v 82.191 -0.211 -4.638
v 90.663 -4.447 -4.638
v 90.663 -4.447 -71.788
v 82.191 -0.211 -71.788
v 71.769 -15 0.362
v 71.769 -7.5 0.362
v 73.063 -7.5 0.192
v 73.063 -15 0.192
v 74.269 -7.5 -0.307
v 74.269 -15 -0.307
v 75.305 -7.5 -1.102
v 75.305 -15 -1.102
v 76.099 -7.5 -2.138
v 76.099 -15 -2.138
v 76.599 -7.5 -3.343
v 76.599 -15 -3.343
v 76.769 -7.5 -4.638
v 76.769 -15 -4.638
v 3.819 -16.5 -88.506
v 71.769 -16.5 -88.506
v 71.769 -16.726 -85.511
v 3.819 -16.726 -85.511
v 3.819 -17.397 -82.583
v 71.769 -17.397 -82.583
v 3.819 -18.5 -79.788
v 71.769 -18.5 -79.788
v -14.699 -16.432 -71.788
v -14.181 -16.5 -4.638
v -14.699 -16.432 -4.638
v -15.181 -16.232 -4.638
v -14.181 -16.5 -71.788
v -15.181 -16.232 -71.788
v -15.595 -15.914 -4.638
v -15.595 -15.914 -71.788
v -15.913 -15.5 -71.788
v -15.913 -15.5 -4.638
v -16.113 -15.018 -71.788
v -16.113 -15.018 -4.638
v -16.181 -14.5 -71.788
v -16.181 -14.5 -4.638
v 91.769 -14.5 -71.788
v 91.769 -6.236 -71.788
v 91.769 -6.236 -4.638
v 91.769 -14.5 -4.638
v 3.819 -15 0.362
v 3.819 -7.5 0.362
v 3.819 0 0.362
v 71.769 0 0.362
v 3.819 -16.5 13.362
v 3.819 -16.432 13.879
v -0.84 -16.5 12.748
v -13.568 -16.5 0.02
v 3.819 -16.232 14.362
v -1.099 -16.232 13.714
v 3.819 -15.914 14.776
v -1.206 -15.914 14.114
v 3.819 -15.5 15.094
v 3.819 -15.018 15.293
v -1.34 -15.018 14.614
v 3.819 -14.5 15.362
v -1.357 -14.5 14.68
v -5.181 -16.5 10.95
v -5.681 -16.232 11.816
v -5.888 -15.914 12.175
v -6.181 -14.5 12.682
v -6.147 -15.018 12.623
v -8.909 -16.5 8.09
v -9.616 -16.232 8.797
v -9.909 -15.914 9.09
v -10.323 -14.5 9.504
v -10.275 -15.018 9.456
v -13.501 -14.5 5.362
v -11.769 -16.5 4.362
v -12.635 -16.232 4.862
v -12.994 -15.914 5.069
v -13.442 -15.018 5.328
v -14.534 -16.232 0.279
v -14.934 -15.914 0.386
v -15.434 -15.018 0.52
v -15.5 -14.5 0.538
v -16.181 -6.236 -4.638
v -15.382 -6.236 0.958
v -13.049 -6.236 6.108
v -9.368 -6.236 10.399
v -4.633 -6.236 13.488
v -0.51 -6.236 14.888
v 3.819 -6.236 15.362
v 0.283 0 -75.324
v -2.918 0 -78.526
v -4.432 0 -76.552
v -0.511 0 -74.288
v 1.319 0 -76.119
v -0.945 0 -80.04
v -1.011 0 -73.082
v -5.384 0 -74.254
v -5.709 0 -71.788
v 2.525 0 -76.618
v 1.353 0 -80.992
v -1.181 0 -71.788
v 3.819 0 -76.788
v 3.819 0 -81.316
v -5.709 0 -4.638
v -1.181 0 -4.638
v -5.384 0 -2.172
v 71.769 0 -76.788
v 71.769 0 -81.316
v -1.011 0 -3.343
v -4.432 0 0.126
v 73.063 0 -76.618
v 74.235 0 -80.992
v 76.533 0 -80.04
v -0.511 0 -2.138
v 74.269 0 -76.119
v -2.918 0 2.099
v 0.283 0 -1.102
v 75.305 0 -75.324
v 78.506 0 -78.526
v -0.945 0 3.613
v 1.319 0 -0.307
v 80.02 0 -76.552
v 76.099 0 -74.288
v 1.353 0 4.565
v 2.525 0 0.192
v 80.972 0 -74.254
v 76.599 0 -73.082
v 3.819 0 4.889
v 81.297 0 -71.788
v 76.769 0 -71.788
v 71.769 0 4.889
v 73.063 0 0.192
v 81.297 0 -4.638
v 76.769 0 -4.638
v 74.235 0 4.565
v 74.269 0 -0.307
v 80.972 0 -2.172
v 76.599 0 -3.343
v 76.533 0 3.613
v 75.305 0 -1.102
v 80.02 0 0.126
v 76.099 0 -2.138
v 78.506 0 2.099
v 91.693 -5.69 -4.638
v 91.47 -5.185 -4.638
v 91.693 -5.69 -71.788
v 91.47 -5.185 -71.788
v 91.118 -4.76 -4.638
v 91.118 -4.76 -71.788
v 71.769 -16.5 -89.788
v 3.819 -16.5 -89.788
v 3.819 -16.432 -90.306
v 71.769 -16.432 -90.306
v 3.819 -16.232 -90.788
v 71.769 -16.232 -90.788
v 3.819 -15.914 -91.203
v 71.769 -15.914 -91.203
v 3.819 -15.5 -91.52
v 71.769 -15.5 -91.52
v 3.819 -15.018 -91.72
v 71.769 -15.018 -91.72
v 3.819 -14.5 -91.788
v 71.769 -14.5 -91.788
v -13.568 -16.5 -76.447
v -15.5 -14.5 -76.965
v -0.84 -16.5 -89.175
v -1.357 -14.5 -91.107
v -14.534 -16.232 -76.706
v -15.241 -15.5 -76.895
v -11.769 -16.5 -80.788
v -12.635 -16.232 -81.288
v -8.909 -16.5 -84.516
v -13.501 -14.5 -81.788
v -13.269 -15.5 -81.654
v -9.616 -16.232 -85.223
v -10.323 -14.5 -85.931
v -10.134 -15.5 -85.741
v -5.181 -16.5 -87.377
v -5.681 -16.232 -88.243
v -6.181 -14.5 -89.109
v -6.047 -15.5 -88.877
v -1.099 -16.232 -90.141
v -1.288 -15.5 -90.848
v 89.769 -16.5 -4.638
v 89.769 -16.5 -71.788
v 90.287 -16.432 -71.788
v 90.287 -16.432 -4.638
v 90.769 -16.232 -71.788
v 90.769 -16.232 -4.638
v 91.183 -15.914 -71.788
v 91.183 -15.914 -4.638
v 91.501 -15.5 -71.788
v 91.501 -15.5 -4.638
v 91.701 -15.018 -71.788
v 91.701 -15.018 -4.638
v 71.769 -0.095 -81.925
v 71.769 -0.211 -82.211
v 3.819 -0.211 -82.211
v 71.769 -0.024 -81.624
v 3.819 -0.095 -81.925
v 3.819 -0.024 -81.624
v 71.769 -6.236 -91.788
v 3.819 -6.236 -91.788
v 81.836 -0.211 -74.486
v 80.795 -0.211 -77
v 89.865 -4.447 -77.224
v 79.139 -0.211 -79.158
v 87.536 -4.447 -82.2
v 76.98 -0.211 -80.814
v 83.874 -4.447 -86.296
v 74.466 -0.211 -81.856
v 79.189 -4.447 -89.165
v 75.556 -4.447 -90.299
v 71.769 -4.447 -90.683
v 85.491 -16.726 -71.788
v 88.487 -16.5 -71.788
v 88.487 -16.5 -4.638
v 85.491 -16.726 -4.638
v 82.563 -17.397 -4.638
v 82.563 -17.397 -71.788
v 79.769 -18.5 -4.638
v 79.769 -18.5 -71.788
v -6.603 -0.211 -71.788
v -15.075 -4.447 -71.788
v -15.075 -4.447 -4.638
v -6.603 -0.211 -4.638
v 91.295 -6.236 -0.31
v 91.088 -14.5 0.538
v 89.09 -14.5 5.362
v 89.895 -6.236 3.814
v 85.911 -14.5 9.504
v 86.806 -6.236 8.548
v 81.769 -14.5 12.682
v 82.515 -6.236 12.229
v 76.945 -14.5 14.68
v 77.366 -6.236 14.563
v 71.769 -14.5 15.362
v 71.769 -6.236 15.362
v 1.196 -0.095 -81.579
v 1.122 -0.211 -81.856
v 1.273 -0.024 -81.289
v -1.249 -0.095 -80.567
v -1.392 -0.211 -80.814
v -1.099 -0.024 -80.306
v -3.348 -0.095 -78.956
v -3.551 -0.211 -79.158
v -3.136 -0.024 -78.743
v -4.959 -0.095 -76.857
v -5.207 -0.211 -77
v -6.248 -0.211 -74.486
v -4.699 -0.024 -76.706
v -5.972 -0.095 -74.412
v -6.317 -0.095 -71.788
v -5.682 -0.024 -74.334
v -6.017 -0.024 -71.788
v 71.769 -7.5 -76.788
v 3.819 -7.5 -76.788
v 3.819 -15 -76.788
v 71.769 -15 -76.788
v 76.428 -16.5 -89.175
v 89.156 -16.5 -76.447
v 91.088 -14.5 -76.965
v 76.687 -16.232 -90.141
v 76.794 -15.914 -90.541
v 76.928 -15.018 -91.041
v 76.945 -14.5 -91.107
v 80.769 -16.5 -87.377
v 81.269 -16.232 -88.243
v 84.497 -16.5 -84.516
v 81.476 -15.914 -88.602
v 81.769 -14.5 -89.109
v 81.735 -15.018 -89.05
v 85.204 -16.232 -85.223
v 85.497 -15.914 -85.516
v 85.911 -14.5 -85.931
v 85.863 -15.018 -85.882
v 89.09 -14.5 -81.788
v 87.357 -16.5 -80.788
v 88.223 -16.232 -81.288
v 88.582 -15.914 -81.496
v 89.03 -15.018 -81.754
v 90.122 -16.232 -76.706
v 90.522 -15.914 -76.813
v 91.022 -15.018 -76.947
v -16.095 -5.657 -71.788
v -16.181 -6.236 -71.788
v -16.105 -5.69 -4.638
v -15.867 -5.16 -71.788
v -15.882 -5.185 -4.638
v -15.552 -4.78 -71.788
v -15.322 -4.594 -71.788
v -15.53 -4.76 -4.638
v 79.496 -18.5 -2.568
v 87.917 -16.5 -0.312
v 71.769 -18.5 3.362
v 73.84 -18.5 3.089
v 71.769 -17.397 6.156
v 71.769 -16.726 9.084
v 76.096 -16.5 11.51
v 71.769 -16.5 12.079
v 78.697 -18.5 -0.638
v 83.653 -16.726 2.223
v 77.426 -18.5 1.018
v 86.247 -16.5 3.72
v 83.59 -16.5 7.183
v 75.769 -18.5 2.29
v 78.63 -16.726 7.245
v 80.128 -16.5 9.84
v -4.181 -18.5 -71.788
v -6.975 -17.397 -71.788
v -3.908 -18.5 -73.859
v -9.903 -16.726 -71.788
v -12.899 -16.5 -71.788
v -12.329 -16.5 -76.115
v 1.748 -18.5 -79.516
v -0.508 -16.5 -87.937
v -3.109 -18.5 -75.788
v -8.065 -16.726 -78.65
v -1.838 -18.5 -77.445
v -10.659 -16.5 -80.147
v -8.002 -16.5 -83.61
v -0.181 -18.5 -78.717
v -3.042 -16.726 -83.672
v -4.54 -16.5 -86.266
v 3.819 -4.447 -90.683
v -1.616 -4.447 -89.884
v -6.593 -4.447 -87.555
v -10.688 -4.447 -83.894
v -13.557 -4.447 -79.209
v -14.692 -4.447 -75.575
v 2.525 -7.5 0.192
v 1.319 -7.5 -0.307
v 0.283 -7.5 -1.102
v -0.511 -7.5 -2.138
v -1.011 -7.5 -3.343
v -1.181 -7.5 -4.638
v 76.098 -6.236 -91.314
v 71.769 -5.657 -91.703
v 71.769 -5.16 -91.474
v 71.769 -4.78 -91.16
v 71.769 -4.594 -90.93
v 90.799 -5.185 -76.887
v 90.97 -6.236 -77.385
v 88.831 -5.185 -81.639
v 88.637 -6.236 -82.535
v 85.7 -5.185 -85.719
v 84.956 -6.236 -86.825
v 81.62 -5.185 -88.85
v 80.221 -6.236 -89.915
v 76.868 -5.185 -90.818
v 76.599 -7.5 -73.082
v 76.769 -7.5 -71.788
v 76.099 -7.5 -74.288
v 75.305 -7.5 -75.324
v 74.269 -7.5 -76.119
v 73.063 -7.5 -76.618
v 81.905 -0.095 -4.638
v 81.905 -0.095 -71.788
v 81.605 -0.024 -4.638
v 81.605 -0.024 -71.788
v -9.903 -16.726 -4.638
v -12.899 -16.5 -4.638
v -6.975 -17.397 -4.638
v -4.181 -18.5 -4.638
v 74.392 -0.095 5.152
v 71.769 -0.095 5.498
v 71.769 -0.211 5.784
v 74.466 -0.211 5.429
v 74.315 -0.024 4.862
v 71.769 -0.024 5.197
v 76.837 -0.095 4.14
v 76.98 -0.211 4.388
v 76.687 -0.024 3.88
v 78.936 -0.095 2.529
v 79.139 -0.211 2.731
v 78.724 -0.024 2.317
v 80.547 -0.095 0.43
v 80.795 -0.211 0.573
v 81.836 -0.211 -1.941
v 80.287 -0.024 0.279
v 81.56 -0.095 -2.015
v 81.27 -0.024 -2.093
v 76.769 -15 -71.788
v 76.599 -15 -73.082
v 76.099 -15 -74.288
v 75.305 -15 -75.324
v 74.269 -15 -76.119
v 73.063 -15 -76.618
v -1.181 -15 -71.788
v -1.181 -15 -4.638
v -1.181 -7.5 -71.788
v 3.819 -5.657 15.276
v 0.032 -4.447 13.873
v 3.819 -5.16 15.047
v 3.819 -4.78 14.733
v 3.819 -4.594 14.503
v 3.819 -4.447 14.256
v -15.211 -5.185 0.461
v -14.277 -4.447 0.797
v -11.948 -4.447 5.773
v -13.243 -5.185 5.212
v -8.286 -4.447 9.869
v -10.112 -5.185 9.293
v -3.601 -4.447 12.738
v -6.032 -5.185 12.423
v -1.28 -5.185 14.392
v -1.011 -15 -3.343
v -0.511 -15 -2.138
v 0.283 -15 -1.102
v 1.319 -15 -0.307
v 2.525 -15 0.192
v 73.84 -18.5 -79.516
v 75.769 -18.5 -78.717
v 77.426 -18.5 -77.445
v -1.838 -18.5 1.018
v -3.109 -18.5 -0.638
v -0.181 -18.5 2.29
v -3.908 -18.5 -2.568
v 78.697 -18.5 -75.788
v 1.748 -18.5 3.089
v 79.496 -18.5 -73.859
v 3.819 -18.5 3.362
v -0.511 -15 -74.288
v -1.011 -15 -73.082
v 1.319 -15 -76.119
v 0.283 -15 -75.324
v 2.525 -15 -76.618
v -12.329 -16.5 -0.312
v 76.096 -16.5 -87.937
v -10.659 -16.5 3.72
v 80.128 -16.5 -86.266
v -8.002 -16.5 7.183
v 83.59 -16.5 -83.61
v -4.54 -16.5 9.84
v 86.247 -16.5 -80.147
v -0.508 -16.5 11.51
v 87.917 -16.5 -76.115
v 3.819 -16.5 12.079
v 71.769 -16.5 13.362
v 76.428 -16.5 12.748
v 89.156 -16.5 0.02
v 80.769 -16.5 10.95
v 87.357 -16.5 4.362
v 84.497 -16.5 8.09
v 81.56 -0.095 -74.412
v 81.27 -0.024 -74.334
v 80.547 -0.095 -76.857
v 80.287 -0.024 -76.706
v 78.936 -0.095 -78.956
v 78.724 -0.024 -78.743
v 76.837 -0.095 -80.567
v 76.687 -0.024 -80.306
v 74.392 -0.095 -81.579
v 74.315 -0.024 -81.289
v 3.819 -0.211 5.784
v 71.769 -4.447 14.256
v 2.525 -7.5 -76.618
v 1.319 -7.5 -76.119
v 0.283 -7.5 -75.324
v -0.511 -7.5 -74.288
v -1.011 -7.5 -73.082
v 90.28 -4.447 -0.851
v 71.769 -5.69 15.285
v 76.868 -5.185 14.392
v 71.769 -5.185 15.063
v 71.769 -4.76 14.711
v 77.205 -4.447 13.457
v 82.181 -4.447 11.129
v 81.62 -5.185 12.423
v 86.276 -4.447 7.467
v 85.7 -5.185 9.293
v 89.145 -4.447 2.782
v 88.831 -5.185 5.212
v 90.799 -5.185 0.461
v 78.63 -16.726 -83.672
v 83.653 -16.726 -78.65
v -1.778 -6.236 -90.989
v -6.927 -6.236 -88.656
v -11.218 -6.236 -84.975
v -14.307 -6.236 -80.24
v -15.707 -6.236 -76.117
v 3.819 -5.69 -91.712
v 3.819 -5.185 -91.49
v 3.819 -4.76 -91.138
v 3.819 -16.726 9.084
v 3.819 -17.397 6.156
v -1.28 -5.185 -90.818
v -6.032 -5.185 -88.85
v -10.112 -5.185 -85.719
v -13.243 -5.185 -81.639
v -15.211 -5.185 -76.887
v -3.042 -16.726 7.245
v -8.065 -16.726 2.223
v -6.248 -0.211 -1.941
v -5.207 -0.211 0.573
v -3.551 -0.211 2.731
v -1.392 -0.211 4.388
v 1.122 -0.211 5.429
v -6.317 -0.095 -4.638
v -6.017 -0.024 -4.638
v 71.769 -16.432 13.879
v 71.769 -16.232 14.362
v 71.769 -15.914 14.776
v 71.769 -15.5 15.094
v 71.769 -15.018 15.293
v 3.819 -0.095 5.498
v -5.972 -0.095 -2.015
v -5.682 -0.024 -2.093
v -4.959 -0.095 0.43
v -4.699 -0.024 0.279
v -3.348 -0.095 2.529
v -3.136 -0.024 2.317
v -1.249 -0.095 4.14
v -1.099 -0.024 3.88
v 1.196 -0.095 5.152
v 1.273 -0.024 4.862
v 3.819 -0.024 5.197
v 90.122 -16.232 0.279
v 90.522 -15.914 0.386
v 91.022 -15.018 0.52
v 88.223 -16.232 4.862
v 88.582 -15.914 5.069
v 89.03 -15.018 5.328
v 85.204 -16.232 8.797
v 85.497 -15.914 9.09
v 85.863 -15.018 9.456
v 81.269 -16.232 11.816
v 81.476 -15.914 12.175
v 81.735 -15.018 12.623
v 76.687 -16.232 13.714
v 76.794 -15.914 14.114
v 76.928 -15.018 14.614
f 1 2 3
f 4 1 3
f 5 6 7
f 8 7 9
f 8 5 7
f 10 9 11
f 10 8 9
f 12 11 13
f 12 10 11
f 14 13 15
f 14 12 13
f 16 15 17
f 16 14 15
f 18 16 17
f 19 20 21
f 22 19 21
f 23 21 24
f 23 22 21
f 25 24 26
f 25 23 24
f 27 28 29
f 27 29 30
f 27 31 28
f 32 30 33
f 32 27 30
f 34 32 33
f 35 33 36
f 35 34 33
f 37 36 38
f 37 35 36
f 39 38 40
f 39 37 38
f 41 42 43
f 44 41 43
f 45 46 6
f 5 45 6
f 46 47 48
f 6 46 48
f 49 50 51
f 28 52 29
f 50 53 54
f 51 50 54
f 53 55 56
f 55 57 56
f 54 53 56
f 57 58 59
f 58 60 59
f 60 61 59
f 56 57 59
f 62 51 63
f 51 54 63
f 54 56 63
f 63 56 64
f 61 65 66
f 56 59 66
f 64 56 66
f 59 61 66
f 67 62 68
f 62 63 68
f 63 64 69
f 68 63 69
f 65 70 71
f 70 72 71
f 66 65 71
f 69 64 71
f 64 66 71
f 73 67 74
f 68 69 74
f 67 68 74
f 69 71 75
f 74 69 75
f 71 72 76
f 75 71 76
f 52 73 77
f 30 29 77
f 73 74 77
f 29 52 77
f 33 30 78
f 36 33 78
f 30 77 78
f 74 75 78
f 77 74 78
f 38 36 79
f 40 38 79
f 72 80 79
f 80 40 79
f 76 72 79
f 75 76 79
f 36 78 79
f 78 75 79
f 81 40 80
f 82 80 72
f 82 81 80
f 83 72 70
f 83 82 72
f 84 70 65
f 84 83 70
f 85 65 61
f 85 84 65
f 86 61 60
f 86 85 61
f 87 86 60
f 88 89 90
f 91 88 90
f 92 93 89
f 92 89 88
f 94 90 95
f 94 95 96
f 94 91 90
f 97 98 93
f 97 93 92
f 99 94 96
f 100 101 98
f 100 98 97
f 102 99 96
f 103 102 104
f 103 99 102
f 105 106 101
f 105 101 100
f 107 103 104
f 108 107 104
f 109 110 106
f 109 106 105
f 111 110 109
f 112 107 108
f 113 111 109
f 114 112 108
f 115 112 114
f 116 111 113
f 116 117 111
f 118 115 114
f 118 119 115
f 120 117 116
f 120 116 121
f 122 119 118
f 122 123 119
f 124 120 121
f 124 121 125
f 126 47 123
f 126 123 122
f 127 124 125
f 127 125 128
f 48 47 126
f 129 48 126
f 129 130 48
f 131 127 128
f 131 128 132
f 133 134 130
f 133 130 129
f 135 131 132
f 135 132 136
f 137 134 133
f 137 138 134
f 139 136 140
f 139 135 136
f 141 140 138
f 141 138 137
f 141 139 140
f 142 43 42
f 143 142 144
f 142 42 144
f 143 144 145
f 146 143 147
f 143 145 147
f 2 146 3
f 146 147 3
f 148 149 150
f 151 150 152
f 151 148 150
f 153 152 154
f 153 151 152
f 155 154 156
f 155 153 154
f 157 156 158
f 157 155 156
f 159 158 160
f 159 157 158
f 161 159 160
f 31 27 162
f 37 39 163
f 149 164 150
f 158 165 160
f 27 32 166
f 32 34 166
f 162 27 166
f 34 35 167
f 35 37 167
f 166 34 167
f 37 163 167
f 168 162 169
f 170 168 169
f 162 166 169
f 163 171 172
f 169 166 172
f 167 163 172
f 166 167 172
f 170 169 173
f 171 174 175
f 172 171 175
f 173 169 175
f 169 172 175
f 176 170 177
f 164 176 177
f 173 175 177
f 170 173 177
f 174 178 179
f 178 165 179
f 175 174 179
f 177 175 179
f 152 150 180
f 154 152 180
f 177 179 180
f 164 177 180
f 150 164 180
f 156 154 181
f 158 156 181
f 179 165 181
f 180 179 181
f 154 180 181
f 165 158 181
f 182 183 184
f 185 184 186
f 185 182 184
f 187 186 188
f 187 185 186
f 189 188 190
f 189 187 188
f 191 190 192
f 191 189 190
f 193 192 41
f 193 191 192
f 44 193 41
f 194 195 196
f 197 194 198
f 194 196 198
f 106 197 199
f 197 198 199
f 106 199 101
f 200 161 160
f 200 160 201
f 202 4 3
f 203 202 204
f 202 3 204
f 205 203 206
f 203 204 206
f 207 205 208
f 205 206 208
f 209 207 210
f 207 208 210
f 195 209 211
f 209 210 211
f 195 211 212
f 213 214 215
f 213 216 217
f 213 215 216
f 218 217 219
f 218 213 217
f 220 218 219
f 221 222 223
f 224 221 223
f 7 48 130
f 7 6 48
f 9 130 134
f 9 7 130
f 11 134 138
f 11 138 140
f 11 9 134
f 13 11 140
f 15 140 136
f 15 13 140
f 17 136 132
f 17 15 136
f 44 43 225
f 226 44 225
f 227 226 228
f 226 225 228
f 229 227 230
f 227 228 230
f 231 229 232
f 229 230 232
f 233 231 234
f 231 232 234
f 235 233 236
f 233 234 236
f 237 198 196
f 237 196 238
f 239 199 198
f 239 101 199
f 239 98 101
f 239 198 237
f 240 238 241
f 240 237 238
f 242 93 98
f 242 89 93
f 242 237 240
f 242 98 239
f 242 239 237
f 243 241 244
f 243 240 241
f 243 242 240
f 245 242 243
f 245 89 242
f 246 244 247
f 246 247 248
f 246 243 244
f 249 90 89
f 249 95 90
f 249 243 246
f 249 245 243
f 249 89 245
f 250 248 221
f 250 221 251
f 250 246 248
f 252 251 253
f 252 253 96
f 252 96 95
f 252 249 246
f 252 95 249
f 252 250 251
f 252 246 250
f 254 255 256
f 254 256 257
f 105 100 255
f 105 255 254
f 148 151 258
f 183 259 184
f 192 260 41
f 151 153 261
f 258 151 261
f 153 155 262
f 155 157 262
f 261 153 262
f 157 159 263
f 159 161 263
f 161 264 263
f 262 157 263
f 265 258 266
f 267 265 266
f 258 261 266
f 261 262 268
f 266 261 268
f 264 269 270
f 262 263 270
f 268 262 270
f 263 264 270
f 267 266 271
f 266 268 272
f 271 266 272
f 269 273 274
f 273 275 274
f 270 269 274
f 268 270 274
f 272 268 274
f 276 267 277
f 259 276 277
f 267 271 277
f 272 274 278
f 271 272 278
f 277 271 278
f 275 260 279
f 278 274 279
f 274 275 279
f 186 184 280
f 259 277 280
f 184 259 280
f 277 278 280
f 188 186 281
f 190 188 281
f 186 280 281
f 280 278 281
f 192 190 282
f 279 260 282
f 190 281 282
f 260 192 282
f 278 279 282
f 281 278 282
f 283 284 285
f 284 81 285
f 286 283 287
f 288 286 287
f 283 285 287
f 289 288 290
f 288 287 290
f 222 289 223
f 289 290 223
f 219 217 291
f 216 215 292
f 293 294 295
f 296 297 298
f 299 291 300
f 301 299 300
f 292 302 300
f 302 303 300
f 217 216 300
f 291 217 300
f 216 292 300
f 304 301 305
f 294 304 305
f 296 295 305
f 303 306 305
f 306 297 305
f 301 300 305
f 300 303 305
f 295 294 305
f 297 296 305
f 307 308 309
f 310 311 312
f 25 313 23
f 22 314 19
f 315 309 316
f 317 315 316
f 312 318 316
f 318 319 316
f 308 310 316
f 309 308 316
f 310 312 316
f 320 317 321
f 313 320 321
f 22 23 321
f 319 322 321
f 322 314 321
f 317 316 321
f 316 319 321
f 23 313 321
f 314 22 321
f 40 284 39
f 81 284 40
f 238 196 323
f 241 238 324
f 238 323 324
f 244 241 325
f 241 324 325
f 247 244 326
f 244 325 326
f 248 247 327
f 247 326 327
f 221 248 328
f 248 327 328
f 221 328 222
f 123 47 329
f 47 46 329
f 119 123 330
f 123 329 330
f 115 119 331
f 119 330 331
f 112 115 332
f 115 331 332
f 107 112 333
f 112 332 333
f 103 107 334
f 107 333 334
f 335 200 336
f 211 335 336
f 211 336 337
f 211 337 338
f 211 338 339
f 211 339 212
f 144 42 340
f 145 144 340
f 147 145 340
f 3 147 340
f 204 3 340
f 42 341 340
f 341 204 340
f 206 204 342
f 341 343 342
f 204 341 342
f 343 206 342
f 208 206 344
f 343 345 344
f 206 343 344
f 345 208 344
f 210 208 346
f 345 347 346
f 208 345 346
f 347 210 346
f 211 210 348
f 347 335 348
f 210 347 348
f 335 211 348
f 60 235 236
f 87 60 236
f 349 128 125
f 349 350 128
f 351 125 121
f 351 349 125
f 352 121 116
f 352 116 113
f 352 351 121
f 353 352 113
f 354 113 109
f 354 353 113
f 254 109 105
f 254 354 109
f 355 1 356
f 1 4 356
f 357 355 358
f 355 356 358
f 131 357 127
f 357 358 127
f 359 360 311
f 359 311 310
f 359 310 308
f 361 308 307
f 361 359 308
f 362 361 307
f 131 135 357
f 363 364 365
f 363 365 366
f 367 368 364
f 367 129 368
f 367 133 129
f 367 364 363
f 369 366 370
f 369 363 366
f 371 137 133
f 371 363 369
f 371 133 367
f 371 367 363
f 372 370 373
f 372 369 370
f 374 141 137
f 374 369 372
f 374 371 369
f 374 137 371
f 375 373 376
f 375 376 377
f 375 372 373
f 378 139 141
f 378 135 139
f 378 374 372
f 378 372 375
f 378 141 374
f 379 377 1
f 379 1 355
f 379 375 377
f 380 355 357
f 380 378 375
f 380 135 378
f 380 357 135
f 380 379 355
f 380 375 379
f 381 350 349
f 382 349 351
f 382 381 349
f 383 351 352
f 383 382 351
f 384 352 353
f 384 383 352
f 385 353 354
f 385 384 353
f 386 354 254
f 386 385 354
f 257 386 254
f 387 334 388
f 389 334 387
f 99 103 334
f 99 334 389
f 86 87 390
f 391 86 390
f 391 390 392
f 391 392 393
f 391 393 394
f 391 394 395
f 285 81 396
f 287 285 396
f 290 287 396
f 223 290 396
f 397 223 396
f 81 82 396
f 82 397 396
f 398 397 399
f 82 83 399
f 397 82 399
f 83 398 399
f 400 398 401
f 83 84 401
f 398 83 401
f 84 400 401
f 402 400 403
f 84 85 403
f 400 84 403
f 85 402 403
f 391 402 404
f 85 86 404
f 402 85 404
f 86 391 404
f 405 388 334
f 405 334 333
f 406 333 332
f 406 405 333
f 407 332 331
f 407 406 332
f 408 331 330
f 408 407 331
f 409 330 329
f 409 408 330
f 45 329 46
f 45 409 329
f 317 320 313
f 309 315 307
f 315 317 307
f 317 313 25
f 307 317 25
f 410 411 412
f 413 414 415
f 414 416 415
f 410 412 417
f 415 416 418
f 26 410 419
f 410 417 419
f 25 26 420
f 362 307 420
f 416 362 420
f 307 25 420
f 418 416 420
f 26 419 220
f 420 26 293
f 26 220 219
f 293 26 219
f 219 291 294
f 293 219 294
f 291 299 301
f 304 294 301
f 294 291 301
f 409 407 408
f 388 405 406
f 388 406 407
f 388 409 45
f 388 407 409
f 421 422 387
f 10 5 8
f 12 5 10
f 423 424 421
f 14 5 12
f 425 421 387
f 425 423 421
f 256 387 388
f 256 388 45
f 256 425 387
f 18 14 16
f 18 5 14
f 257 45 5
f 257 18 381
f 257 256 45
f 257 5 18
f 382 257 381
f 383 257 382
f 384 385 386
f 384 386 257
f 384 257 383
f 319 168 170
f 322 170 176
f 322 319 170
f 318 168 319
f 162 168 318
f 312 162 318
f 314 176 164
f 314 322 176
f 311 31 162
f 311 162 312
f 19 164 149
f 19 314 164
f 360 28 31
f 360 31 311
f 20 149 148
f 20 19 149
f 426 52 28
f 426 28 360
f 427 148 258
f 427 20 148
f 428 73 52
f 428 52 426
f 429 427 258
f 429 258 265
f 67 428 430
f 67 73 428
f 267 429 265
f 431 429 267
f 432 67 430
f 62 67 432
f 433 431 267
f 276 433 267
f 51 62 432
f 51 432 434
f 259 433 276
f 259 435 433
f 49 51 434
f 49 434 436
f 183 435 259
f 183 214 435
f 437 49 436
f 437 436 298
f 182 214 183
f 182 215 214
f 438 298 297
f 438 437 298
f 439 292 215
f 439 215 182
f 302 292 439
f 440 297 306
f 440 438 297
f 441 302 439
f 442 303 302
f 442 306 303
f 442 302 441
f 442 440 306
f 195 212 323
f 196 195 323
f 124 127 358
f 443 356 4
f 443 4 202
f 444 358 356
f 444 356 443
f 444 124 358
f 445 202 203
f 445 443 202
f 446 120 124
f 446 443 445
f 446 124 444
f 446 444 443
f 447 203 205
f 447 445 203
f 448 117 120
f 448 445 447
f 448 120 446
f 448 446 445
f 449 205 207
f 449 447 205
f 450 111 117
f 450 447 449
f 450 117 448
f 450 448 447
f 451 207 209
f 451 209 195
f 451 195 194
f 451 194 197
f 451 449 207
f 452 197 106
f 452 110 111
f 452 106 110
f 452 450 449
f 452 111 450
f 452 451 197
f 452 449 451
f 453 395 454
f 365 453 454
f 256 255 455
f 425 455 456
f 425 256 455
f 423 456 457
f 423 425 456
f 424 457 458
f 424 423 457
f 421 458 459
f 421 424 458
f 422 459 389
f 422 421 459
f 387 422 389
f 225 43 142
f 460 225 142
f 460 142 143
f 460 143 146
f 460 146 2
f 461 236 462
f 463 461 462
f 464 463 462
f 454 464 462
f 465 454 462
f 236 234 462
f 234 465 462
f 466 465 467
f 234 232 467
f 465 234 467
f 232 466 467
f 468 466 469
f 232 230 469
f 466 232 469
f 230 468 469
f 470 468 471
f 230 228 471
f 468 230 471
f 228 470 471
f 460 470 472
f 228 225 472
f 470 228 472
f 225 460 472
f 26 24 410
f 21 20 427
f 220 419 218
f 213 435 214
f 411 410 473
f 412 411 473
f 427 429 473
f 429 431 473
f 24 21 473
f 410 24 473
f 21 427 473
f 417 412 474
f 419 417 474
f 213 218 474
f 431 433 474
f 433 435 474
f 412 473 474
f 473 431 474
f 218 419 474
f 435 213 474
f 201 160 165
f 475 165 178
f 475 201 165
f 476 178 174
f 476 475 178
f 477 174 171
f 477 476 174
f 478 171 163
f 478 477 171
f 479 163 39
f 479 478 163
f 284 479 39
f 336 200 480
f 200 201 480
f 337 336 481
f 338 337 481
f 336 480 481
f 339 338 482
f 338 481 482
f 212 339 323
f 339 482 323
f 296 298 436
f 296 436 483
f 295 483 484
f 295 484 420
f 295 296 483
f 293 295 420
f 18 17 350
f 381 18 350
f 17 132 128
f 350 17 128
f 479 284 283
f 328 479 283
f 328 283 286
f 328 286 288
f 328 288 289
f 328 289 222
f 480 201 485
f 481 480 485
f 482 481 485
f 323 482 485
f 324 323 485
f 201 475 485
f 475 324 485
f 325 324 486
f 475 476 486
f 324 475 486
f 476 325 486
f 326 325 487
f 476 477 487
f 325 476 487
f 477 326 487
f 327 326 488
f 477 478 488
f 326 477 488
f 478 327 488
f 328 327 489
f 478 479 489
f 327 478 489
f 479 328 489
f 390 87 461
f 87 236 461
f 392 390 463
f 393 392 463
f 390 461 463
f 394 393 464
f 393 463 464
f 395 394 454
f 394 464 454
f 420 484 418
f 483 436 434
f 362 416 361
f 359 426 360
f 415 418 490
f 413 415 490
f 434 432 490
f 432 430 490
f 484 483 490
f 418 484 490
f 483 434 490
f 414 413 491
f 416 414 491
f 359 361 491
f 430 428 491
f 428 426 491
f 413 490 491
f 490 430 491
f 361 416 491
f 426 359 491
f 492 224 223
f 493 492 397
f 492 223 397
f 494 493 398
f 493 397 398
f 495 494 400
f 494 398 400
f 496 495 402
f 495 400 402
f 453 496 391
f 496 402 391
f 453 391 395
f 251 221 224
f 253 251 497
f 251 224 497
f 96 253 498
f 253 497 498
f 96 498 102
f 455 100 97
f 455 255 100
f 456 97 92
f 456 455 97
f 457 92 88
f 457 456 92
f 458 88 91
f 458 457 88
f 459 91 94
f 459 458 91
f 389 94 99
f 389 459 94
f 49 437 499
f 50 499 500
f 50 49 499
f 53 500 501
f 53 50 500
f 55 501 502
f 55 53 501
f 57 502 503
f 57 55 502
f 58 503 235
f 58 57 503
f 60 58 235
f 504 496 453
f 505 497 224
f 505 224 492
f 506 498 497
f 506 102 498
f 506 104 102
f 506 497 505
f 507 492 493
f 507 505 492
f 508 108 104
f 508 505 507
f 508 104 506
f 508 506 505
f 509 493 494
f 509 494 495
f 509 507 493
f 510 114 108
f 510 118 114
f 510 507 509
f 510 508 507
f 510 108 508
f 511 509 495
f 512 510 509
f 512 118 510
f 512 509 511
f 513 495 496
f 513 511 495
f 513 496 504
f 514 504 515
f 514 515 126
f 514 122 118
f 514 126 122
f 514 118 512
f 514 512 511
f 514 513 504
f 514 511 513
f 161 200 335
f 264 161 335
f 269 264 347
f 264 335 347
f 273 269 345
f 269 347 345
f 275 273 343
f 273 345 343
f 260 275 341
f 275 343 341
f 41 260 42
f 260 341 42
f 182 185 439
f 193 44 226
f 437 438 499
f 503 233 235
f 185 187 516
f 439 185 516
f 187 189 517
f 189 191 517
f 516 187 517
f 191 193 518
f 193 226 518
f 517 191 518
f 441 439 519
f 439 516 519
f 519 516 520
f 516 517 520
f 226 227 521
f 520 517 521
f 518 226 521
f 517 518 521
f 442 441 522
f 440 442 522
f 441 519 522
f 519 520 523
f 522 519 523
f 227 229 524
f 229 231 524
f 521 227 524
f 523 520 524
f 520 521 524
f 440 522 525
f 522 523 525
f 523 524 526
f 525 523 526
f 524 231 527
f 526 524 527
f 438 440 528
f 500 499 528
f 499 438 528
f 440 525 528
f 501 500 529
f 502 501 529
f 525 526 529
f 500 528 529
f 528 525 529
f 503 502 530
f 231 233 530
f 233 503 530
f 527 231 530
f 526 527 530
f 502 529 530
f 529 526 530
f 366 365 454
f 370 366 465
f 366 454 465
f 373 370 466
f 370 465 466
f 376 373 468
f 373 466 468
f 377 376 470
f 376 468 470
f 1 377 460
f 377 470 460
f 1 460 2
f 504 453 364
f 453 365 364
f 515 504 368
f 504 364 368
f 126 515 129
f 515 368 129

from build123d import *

# Parameters (mm, degrees)
SKETCH5_W           = 107.15
SKETCH5_H           = 18.5
BOSS_EXTRUDE1_DEPTH = 107.94999
SKETCH4_W           = 77.94999
SKETCH4_H           = 77.15084
CUT_EXTRUDE1_DEPTH  = 7.5
FILLET1_R           = 5
FILLET3_R           = 20
CHAMFER1_SIZE       = 10
CHAMFER1_SIZE2      = 5
CUT_EXTRUDE2_DEPTH  = 2
FILLET4_R           = 20
FILLET5_R           = 2
CUT_EXTRUDE3_START  = -7.5
CUT_EXTRUDE3_DEPTH  = 7.5


with BuildPart() as part:
    # Sketch5 → Boss-Extrude1 (new body)
    with BuildSketch(Plane.ZY.offset(-91.769)):
        with Locations((-38.2134, -9.25)):
            Rectangle(SKETCH5_W, SKETCH5_H)
    extrude(amount=BOSS_EXTRUDE1_DEPTH)

    # Sketch4 → Cut-Extrude1 (cut)
    with BuildSketch(Plane(origin=(0, 0, 0), x_dir=(1, 0, 0), z_dir=(0, 1, 0))):
        with Locations((37.794005, 38.21298)):
            Rectangle(SKETCH4_W, SKETCH4_H)
    extrude(amount=-CUT_EXTRUDE1_DEPTH, mode=Mode.SUBTRACT)

    # Fillet1
    fillet1_edges = [part.edges().sort_by_distance(p)[0] for p in [
        (76.769, -3.75, -76.7884),
        (76.769, -3.75, 0.36244),
        (-1.18099, -3.75, 0.36244),
        (-1.18099, -3.75, -76.7884),
    ]]
    fillet(fillet1_edges, radius=FILLET1_R)

    # Fillet3
    fillet3_edges = [part.edges().sort_by_distance(p)[0] for p in [
        (-16.18099, -9.25, -91.7884),
        (-16.18099, -9.25, 15.3616),
        (91.769, -9.25, -91.7884),
        (91.769, -9.25, 15.3616),
    ]]
    fillet(fillet3_edges, radius=FILLET3_R)

    # Chamfer1
    chamfer1_edges = [part.edges().sort_by_distance(p)[0] for p in [
        (37.794005, 0, -91.7884),
        (91.769, 0, -38.2134),
        (-16.18099, 0, -38.2134),
        (37.794005, 0, 15.3616),
        (-10.323125624, 0, -85.930535624),
        (-10.323125624, 0, 9.503735624),
        (85.911135624, 0, 9.503735624),
        (85.911135624, 0, -85.930535624),
    ]]
    chamfer1_side = [part.faces().sort_by_distance(p)[0] for p in [
        (37.794005, 0, 13.840602865),
    ]]
    chamfer(chamfer1_edges, length=CHAMFER1_SIZE, length2=CHAMFER1_SIZE2, reference=chamfer1_side[0])

    # Sketch6 → Cut-Extrude2 (cut)
    with BuildSketch(Plane.XZ.offset(18.5)):
        with BuildLine():
            Line((3.81901, -91.7884), (71.769, -91.7884))
            ThreePointArc((71.769, -91.7884), (85.911135624, -85.930535624), (91.769, -71.7884))
            Line((91.769, -71.7884), (91.769, -4.6384))
            ThreePointArc((91.769, -4.6384), (85.911135624, 9.503735624), (71.769, 15.3616))
            Line((71.769, 15.3616), (3.81901, 15.3616))
            ThreePointArc((3.81901, 15.3616), (-10.323125624, 9.503735624), (-16.18099, -4.6384))
            Line((-16.18099, -4.6384), (-16.18099, -71.7884))
            ThreePointArc((-16.18099, -71.7884), (-10.323125624, -85.930535624), (3.81901, -91.7884))
        make_face()
        with BuildLine():
            Line((3.81901, -79.7884), (71.769, -79.7884))
            ThreePointArc((71.769, -79.7884), (77.425854249, -77.445254249), (79.769, -71.7884))
            Line((79.769, -71.7884), (79.769, -4.6384))
            ThreePointArc((79.769, -4.6384), (77.425854249, 1.018454249), (71.769, 3.3616))
            Line((71.769, 3.3616), (3.81901, 3.3616))
            ThreePointArc((3.81901, 3.3616), (-1.837844249, 1.018454249), (-4.18099, -4.6384))
            Line((-4.18099, -4.6384), (-4.18099, -71.7884))
            ThreePointArc((-4.18099, -71.7884), (-1.837844249, -77.445254249), (3.81901, -79.7884))
        make_face(mode=Mode.SUBTRACT)
    extrude(amount=-CUT_EXTRUDE2_DEPTH, mode=Mode.SUBTRACT)

    # Fillet4
    # the kernel refuses this fillet: 20 mm, written as the material it adds along each edge
    with BuildSketch(Plane(origin=(71.769, -16.5, -4.6384), x_dir=(1, 0, 0), z_dir=(0, 0, -1))) as fillet4_piece_1:
        with BuildLine():
            CenterArc((16.717797887, 20), FILLET4_R, 244.158067237, 25.841932763)
            Line((8, 2), (8, 0))
            Line((8, 0), (16.717797887, 0))
        make_face()
    revolve(axis=Axis((71.769, -16.5, -4.6384), (0, -1, 0)), revolution_arc=90)
    with BuildSketch(Plane(origin=(79.769, -16.5, -71.7884), x_dir=(1, 0, 0), z_dir=(0, 0, 1)), Plane(origin=(-4.18099, -16.5, -4.6384), x_dir=(-1, 0, 0), z_dir=(0, 0, -1))) as fillet4_piece_2:
        with BuildLine():
            CenterArc((8.717797887, -20), FILLET4_R, 90, 25.841932763)
            Line((0, -2), (0, 0))
            Line((0, 0), (8.717797887, 0))
        make_face()
    extrude(amount=67.15)
    with BuildSketch(Plane(origin=(71.769, -16.5, -71.7884), x_dir=(0, 0, -1), z_dir=(-1, 0, 0))) as fillet4_piece_3:
        with BuildLine():
            CenterArc((16.717797887, 20), FILLET4_R, 244.158067237, 25.841932763)
            Line((8, 2), (8, 0))
            Line((8, 0), (16.717797887, 0))
        make_face()
    revolve(axis=Axis((71.769, -16.5, -71.7884), (0, -1, 0)), revolution_arc=90)
    with BuildSketch(Plane(origin=(3.81901, -16.5, -79.7884), x_dir=(0, 0, -1), z_dir=(1, 0, 0)), Plane(origin=(71.769, -16.5, 3.3616), x_dir=(0, 0, 1), z_dir=(-1, 0, 0))) as fillet4_piece_4:
        with BuildLine():
            CenterArc((8.717797887, -20), FILLET4_R, 90, 25.841932763)
            Line((0, -2), (0, 0))
            Line((0, 0), (8.717797887, 0))
        make_face()
    extrude(amount=67.94999)
    with BuildSketch(Plane(origin=(3.81901, -16.5, -71.7884), x_dir=(-1, 0, 0), z_dir=(0, 0, 1))) as fillet4_piece_5:
        with BuildLine():
            CenterArc((16.717797887, 20), FILLET4_R, 244.158067237, 25.841932763)
            Line((8, 2), (8, 0))
            Line((8, 0), (16.717797887, 0))
        make_face()
    revolve(axis=Axis((3.81901, -16.5, -71.7884), (0, -1, 0)), revolution_arc=90)
    with BuildSketch(Plane(origin=(3.81901, -16.5, -4.6384), x_dir=(0, 0, 1), z_dir=(1, 0, 0))) as fillet4_piece_6:
        with BuildLine():
            CenterArc((16.717797887, 20), FILLET4_R, 244.158067237, 25.841932763)
            Line((8, 2), (8, 0))
            Line((8, 0), (16.717797887, 0))
        make_face()
    revolve(axis=Axis((3.81901, -16.5, -4.6384), (0, -1, 0)), revolution_arc=90)

    # Fillet5
    fillet5_edges = [part.edges().sort_by_distance(p)[0] for p in [
        (-10.323125624, -16.5, -85.930535624),
        (-16.18099, -16.5, -38.2134),
        (-10.323125624, -16.5, 9.503735624),
        (37.794005, -16.5, 15.3616),
        (85.911135624, -16.5, 9.503735624),
        (91.769, -16.5, -38.2134),
        (85.911135624, -16.5, -85.930535624),
        (37.794005, -16.5, -91.7884),
        (-6.18099, 0, -38.2134),
        (-3.252057812, 0, -78.859467812),
        (-3.252057812, 0, 2.432667812),
        (37.794005, 0, -81.7884),
        (37.794005, 0, 5.3616),
        (78.840067812, 0, -78.859467812),
        (78.840067812, 0, 2.432667812),
        (81.769, 0, -38.2134),
        (91.769, -5, -38.2134),
        (85.911135624, -5, 9.503735624),
        (85.911135624, -5, -85.930535624),
        (37.794005, -5, 15.3616),
        (37.794005, -5, -91.7884),
        (-10.323125624, -5, 9.503735624),
        (-10.323125624, -5, -85.930535624),
        (-16.18099, -5, -38.2134),
    ]]
    fillet(fillet5_edges, radius=FILLET5_R)

    # Sketch8 → Cut-Extrude3 (cut)
    with BuildSketch(Plane(origin=(0, -7.5, 0), x_dir=(1, 0, 0), z_dir=(0, 1, 0)).offset(CUT_EXTRUDE3_START)):
        with BuildLine():
            Line((-1.18099, 71.7884), (-1.18099, 4.63756))
            ThreePointArc((-1.18099, 4.63756), (0.283476094, 1.102026094), (3.81901, -0.36244))
            Line((3.81901, -0.36244), (71.769, -0.36244))
            ThreePointArc((71.769, -0.36244), (75.304533906, 1.102026094), (76.769, 4.63756))
            Line((76.769, 4.63756), (76.769, 71.7884))
            ThreePointArc((76.769, 71.7884), (75.304533906, 75.323933906), (71.769, 76.7884))
            Line((71.769, 76.7884), (3.81901, 76.7884))
            ThreePointArc((3.81901, 76.7884), (0.283476094, 75.323933906), (-1.18099, 71.7884))
        make_face()
    extrude(amount=CUT_EXTRUDE3_DEPTH, mode=Mode.SUBTRACT)


solid = part.part
